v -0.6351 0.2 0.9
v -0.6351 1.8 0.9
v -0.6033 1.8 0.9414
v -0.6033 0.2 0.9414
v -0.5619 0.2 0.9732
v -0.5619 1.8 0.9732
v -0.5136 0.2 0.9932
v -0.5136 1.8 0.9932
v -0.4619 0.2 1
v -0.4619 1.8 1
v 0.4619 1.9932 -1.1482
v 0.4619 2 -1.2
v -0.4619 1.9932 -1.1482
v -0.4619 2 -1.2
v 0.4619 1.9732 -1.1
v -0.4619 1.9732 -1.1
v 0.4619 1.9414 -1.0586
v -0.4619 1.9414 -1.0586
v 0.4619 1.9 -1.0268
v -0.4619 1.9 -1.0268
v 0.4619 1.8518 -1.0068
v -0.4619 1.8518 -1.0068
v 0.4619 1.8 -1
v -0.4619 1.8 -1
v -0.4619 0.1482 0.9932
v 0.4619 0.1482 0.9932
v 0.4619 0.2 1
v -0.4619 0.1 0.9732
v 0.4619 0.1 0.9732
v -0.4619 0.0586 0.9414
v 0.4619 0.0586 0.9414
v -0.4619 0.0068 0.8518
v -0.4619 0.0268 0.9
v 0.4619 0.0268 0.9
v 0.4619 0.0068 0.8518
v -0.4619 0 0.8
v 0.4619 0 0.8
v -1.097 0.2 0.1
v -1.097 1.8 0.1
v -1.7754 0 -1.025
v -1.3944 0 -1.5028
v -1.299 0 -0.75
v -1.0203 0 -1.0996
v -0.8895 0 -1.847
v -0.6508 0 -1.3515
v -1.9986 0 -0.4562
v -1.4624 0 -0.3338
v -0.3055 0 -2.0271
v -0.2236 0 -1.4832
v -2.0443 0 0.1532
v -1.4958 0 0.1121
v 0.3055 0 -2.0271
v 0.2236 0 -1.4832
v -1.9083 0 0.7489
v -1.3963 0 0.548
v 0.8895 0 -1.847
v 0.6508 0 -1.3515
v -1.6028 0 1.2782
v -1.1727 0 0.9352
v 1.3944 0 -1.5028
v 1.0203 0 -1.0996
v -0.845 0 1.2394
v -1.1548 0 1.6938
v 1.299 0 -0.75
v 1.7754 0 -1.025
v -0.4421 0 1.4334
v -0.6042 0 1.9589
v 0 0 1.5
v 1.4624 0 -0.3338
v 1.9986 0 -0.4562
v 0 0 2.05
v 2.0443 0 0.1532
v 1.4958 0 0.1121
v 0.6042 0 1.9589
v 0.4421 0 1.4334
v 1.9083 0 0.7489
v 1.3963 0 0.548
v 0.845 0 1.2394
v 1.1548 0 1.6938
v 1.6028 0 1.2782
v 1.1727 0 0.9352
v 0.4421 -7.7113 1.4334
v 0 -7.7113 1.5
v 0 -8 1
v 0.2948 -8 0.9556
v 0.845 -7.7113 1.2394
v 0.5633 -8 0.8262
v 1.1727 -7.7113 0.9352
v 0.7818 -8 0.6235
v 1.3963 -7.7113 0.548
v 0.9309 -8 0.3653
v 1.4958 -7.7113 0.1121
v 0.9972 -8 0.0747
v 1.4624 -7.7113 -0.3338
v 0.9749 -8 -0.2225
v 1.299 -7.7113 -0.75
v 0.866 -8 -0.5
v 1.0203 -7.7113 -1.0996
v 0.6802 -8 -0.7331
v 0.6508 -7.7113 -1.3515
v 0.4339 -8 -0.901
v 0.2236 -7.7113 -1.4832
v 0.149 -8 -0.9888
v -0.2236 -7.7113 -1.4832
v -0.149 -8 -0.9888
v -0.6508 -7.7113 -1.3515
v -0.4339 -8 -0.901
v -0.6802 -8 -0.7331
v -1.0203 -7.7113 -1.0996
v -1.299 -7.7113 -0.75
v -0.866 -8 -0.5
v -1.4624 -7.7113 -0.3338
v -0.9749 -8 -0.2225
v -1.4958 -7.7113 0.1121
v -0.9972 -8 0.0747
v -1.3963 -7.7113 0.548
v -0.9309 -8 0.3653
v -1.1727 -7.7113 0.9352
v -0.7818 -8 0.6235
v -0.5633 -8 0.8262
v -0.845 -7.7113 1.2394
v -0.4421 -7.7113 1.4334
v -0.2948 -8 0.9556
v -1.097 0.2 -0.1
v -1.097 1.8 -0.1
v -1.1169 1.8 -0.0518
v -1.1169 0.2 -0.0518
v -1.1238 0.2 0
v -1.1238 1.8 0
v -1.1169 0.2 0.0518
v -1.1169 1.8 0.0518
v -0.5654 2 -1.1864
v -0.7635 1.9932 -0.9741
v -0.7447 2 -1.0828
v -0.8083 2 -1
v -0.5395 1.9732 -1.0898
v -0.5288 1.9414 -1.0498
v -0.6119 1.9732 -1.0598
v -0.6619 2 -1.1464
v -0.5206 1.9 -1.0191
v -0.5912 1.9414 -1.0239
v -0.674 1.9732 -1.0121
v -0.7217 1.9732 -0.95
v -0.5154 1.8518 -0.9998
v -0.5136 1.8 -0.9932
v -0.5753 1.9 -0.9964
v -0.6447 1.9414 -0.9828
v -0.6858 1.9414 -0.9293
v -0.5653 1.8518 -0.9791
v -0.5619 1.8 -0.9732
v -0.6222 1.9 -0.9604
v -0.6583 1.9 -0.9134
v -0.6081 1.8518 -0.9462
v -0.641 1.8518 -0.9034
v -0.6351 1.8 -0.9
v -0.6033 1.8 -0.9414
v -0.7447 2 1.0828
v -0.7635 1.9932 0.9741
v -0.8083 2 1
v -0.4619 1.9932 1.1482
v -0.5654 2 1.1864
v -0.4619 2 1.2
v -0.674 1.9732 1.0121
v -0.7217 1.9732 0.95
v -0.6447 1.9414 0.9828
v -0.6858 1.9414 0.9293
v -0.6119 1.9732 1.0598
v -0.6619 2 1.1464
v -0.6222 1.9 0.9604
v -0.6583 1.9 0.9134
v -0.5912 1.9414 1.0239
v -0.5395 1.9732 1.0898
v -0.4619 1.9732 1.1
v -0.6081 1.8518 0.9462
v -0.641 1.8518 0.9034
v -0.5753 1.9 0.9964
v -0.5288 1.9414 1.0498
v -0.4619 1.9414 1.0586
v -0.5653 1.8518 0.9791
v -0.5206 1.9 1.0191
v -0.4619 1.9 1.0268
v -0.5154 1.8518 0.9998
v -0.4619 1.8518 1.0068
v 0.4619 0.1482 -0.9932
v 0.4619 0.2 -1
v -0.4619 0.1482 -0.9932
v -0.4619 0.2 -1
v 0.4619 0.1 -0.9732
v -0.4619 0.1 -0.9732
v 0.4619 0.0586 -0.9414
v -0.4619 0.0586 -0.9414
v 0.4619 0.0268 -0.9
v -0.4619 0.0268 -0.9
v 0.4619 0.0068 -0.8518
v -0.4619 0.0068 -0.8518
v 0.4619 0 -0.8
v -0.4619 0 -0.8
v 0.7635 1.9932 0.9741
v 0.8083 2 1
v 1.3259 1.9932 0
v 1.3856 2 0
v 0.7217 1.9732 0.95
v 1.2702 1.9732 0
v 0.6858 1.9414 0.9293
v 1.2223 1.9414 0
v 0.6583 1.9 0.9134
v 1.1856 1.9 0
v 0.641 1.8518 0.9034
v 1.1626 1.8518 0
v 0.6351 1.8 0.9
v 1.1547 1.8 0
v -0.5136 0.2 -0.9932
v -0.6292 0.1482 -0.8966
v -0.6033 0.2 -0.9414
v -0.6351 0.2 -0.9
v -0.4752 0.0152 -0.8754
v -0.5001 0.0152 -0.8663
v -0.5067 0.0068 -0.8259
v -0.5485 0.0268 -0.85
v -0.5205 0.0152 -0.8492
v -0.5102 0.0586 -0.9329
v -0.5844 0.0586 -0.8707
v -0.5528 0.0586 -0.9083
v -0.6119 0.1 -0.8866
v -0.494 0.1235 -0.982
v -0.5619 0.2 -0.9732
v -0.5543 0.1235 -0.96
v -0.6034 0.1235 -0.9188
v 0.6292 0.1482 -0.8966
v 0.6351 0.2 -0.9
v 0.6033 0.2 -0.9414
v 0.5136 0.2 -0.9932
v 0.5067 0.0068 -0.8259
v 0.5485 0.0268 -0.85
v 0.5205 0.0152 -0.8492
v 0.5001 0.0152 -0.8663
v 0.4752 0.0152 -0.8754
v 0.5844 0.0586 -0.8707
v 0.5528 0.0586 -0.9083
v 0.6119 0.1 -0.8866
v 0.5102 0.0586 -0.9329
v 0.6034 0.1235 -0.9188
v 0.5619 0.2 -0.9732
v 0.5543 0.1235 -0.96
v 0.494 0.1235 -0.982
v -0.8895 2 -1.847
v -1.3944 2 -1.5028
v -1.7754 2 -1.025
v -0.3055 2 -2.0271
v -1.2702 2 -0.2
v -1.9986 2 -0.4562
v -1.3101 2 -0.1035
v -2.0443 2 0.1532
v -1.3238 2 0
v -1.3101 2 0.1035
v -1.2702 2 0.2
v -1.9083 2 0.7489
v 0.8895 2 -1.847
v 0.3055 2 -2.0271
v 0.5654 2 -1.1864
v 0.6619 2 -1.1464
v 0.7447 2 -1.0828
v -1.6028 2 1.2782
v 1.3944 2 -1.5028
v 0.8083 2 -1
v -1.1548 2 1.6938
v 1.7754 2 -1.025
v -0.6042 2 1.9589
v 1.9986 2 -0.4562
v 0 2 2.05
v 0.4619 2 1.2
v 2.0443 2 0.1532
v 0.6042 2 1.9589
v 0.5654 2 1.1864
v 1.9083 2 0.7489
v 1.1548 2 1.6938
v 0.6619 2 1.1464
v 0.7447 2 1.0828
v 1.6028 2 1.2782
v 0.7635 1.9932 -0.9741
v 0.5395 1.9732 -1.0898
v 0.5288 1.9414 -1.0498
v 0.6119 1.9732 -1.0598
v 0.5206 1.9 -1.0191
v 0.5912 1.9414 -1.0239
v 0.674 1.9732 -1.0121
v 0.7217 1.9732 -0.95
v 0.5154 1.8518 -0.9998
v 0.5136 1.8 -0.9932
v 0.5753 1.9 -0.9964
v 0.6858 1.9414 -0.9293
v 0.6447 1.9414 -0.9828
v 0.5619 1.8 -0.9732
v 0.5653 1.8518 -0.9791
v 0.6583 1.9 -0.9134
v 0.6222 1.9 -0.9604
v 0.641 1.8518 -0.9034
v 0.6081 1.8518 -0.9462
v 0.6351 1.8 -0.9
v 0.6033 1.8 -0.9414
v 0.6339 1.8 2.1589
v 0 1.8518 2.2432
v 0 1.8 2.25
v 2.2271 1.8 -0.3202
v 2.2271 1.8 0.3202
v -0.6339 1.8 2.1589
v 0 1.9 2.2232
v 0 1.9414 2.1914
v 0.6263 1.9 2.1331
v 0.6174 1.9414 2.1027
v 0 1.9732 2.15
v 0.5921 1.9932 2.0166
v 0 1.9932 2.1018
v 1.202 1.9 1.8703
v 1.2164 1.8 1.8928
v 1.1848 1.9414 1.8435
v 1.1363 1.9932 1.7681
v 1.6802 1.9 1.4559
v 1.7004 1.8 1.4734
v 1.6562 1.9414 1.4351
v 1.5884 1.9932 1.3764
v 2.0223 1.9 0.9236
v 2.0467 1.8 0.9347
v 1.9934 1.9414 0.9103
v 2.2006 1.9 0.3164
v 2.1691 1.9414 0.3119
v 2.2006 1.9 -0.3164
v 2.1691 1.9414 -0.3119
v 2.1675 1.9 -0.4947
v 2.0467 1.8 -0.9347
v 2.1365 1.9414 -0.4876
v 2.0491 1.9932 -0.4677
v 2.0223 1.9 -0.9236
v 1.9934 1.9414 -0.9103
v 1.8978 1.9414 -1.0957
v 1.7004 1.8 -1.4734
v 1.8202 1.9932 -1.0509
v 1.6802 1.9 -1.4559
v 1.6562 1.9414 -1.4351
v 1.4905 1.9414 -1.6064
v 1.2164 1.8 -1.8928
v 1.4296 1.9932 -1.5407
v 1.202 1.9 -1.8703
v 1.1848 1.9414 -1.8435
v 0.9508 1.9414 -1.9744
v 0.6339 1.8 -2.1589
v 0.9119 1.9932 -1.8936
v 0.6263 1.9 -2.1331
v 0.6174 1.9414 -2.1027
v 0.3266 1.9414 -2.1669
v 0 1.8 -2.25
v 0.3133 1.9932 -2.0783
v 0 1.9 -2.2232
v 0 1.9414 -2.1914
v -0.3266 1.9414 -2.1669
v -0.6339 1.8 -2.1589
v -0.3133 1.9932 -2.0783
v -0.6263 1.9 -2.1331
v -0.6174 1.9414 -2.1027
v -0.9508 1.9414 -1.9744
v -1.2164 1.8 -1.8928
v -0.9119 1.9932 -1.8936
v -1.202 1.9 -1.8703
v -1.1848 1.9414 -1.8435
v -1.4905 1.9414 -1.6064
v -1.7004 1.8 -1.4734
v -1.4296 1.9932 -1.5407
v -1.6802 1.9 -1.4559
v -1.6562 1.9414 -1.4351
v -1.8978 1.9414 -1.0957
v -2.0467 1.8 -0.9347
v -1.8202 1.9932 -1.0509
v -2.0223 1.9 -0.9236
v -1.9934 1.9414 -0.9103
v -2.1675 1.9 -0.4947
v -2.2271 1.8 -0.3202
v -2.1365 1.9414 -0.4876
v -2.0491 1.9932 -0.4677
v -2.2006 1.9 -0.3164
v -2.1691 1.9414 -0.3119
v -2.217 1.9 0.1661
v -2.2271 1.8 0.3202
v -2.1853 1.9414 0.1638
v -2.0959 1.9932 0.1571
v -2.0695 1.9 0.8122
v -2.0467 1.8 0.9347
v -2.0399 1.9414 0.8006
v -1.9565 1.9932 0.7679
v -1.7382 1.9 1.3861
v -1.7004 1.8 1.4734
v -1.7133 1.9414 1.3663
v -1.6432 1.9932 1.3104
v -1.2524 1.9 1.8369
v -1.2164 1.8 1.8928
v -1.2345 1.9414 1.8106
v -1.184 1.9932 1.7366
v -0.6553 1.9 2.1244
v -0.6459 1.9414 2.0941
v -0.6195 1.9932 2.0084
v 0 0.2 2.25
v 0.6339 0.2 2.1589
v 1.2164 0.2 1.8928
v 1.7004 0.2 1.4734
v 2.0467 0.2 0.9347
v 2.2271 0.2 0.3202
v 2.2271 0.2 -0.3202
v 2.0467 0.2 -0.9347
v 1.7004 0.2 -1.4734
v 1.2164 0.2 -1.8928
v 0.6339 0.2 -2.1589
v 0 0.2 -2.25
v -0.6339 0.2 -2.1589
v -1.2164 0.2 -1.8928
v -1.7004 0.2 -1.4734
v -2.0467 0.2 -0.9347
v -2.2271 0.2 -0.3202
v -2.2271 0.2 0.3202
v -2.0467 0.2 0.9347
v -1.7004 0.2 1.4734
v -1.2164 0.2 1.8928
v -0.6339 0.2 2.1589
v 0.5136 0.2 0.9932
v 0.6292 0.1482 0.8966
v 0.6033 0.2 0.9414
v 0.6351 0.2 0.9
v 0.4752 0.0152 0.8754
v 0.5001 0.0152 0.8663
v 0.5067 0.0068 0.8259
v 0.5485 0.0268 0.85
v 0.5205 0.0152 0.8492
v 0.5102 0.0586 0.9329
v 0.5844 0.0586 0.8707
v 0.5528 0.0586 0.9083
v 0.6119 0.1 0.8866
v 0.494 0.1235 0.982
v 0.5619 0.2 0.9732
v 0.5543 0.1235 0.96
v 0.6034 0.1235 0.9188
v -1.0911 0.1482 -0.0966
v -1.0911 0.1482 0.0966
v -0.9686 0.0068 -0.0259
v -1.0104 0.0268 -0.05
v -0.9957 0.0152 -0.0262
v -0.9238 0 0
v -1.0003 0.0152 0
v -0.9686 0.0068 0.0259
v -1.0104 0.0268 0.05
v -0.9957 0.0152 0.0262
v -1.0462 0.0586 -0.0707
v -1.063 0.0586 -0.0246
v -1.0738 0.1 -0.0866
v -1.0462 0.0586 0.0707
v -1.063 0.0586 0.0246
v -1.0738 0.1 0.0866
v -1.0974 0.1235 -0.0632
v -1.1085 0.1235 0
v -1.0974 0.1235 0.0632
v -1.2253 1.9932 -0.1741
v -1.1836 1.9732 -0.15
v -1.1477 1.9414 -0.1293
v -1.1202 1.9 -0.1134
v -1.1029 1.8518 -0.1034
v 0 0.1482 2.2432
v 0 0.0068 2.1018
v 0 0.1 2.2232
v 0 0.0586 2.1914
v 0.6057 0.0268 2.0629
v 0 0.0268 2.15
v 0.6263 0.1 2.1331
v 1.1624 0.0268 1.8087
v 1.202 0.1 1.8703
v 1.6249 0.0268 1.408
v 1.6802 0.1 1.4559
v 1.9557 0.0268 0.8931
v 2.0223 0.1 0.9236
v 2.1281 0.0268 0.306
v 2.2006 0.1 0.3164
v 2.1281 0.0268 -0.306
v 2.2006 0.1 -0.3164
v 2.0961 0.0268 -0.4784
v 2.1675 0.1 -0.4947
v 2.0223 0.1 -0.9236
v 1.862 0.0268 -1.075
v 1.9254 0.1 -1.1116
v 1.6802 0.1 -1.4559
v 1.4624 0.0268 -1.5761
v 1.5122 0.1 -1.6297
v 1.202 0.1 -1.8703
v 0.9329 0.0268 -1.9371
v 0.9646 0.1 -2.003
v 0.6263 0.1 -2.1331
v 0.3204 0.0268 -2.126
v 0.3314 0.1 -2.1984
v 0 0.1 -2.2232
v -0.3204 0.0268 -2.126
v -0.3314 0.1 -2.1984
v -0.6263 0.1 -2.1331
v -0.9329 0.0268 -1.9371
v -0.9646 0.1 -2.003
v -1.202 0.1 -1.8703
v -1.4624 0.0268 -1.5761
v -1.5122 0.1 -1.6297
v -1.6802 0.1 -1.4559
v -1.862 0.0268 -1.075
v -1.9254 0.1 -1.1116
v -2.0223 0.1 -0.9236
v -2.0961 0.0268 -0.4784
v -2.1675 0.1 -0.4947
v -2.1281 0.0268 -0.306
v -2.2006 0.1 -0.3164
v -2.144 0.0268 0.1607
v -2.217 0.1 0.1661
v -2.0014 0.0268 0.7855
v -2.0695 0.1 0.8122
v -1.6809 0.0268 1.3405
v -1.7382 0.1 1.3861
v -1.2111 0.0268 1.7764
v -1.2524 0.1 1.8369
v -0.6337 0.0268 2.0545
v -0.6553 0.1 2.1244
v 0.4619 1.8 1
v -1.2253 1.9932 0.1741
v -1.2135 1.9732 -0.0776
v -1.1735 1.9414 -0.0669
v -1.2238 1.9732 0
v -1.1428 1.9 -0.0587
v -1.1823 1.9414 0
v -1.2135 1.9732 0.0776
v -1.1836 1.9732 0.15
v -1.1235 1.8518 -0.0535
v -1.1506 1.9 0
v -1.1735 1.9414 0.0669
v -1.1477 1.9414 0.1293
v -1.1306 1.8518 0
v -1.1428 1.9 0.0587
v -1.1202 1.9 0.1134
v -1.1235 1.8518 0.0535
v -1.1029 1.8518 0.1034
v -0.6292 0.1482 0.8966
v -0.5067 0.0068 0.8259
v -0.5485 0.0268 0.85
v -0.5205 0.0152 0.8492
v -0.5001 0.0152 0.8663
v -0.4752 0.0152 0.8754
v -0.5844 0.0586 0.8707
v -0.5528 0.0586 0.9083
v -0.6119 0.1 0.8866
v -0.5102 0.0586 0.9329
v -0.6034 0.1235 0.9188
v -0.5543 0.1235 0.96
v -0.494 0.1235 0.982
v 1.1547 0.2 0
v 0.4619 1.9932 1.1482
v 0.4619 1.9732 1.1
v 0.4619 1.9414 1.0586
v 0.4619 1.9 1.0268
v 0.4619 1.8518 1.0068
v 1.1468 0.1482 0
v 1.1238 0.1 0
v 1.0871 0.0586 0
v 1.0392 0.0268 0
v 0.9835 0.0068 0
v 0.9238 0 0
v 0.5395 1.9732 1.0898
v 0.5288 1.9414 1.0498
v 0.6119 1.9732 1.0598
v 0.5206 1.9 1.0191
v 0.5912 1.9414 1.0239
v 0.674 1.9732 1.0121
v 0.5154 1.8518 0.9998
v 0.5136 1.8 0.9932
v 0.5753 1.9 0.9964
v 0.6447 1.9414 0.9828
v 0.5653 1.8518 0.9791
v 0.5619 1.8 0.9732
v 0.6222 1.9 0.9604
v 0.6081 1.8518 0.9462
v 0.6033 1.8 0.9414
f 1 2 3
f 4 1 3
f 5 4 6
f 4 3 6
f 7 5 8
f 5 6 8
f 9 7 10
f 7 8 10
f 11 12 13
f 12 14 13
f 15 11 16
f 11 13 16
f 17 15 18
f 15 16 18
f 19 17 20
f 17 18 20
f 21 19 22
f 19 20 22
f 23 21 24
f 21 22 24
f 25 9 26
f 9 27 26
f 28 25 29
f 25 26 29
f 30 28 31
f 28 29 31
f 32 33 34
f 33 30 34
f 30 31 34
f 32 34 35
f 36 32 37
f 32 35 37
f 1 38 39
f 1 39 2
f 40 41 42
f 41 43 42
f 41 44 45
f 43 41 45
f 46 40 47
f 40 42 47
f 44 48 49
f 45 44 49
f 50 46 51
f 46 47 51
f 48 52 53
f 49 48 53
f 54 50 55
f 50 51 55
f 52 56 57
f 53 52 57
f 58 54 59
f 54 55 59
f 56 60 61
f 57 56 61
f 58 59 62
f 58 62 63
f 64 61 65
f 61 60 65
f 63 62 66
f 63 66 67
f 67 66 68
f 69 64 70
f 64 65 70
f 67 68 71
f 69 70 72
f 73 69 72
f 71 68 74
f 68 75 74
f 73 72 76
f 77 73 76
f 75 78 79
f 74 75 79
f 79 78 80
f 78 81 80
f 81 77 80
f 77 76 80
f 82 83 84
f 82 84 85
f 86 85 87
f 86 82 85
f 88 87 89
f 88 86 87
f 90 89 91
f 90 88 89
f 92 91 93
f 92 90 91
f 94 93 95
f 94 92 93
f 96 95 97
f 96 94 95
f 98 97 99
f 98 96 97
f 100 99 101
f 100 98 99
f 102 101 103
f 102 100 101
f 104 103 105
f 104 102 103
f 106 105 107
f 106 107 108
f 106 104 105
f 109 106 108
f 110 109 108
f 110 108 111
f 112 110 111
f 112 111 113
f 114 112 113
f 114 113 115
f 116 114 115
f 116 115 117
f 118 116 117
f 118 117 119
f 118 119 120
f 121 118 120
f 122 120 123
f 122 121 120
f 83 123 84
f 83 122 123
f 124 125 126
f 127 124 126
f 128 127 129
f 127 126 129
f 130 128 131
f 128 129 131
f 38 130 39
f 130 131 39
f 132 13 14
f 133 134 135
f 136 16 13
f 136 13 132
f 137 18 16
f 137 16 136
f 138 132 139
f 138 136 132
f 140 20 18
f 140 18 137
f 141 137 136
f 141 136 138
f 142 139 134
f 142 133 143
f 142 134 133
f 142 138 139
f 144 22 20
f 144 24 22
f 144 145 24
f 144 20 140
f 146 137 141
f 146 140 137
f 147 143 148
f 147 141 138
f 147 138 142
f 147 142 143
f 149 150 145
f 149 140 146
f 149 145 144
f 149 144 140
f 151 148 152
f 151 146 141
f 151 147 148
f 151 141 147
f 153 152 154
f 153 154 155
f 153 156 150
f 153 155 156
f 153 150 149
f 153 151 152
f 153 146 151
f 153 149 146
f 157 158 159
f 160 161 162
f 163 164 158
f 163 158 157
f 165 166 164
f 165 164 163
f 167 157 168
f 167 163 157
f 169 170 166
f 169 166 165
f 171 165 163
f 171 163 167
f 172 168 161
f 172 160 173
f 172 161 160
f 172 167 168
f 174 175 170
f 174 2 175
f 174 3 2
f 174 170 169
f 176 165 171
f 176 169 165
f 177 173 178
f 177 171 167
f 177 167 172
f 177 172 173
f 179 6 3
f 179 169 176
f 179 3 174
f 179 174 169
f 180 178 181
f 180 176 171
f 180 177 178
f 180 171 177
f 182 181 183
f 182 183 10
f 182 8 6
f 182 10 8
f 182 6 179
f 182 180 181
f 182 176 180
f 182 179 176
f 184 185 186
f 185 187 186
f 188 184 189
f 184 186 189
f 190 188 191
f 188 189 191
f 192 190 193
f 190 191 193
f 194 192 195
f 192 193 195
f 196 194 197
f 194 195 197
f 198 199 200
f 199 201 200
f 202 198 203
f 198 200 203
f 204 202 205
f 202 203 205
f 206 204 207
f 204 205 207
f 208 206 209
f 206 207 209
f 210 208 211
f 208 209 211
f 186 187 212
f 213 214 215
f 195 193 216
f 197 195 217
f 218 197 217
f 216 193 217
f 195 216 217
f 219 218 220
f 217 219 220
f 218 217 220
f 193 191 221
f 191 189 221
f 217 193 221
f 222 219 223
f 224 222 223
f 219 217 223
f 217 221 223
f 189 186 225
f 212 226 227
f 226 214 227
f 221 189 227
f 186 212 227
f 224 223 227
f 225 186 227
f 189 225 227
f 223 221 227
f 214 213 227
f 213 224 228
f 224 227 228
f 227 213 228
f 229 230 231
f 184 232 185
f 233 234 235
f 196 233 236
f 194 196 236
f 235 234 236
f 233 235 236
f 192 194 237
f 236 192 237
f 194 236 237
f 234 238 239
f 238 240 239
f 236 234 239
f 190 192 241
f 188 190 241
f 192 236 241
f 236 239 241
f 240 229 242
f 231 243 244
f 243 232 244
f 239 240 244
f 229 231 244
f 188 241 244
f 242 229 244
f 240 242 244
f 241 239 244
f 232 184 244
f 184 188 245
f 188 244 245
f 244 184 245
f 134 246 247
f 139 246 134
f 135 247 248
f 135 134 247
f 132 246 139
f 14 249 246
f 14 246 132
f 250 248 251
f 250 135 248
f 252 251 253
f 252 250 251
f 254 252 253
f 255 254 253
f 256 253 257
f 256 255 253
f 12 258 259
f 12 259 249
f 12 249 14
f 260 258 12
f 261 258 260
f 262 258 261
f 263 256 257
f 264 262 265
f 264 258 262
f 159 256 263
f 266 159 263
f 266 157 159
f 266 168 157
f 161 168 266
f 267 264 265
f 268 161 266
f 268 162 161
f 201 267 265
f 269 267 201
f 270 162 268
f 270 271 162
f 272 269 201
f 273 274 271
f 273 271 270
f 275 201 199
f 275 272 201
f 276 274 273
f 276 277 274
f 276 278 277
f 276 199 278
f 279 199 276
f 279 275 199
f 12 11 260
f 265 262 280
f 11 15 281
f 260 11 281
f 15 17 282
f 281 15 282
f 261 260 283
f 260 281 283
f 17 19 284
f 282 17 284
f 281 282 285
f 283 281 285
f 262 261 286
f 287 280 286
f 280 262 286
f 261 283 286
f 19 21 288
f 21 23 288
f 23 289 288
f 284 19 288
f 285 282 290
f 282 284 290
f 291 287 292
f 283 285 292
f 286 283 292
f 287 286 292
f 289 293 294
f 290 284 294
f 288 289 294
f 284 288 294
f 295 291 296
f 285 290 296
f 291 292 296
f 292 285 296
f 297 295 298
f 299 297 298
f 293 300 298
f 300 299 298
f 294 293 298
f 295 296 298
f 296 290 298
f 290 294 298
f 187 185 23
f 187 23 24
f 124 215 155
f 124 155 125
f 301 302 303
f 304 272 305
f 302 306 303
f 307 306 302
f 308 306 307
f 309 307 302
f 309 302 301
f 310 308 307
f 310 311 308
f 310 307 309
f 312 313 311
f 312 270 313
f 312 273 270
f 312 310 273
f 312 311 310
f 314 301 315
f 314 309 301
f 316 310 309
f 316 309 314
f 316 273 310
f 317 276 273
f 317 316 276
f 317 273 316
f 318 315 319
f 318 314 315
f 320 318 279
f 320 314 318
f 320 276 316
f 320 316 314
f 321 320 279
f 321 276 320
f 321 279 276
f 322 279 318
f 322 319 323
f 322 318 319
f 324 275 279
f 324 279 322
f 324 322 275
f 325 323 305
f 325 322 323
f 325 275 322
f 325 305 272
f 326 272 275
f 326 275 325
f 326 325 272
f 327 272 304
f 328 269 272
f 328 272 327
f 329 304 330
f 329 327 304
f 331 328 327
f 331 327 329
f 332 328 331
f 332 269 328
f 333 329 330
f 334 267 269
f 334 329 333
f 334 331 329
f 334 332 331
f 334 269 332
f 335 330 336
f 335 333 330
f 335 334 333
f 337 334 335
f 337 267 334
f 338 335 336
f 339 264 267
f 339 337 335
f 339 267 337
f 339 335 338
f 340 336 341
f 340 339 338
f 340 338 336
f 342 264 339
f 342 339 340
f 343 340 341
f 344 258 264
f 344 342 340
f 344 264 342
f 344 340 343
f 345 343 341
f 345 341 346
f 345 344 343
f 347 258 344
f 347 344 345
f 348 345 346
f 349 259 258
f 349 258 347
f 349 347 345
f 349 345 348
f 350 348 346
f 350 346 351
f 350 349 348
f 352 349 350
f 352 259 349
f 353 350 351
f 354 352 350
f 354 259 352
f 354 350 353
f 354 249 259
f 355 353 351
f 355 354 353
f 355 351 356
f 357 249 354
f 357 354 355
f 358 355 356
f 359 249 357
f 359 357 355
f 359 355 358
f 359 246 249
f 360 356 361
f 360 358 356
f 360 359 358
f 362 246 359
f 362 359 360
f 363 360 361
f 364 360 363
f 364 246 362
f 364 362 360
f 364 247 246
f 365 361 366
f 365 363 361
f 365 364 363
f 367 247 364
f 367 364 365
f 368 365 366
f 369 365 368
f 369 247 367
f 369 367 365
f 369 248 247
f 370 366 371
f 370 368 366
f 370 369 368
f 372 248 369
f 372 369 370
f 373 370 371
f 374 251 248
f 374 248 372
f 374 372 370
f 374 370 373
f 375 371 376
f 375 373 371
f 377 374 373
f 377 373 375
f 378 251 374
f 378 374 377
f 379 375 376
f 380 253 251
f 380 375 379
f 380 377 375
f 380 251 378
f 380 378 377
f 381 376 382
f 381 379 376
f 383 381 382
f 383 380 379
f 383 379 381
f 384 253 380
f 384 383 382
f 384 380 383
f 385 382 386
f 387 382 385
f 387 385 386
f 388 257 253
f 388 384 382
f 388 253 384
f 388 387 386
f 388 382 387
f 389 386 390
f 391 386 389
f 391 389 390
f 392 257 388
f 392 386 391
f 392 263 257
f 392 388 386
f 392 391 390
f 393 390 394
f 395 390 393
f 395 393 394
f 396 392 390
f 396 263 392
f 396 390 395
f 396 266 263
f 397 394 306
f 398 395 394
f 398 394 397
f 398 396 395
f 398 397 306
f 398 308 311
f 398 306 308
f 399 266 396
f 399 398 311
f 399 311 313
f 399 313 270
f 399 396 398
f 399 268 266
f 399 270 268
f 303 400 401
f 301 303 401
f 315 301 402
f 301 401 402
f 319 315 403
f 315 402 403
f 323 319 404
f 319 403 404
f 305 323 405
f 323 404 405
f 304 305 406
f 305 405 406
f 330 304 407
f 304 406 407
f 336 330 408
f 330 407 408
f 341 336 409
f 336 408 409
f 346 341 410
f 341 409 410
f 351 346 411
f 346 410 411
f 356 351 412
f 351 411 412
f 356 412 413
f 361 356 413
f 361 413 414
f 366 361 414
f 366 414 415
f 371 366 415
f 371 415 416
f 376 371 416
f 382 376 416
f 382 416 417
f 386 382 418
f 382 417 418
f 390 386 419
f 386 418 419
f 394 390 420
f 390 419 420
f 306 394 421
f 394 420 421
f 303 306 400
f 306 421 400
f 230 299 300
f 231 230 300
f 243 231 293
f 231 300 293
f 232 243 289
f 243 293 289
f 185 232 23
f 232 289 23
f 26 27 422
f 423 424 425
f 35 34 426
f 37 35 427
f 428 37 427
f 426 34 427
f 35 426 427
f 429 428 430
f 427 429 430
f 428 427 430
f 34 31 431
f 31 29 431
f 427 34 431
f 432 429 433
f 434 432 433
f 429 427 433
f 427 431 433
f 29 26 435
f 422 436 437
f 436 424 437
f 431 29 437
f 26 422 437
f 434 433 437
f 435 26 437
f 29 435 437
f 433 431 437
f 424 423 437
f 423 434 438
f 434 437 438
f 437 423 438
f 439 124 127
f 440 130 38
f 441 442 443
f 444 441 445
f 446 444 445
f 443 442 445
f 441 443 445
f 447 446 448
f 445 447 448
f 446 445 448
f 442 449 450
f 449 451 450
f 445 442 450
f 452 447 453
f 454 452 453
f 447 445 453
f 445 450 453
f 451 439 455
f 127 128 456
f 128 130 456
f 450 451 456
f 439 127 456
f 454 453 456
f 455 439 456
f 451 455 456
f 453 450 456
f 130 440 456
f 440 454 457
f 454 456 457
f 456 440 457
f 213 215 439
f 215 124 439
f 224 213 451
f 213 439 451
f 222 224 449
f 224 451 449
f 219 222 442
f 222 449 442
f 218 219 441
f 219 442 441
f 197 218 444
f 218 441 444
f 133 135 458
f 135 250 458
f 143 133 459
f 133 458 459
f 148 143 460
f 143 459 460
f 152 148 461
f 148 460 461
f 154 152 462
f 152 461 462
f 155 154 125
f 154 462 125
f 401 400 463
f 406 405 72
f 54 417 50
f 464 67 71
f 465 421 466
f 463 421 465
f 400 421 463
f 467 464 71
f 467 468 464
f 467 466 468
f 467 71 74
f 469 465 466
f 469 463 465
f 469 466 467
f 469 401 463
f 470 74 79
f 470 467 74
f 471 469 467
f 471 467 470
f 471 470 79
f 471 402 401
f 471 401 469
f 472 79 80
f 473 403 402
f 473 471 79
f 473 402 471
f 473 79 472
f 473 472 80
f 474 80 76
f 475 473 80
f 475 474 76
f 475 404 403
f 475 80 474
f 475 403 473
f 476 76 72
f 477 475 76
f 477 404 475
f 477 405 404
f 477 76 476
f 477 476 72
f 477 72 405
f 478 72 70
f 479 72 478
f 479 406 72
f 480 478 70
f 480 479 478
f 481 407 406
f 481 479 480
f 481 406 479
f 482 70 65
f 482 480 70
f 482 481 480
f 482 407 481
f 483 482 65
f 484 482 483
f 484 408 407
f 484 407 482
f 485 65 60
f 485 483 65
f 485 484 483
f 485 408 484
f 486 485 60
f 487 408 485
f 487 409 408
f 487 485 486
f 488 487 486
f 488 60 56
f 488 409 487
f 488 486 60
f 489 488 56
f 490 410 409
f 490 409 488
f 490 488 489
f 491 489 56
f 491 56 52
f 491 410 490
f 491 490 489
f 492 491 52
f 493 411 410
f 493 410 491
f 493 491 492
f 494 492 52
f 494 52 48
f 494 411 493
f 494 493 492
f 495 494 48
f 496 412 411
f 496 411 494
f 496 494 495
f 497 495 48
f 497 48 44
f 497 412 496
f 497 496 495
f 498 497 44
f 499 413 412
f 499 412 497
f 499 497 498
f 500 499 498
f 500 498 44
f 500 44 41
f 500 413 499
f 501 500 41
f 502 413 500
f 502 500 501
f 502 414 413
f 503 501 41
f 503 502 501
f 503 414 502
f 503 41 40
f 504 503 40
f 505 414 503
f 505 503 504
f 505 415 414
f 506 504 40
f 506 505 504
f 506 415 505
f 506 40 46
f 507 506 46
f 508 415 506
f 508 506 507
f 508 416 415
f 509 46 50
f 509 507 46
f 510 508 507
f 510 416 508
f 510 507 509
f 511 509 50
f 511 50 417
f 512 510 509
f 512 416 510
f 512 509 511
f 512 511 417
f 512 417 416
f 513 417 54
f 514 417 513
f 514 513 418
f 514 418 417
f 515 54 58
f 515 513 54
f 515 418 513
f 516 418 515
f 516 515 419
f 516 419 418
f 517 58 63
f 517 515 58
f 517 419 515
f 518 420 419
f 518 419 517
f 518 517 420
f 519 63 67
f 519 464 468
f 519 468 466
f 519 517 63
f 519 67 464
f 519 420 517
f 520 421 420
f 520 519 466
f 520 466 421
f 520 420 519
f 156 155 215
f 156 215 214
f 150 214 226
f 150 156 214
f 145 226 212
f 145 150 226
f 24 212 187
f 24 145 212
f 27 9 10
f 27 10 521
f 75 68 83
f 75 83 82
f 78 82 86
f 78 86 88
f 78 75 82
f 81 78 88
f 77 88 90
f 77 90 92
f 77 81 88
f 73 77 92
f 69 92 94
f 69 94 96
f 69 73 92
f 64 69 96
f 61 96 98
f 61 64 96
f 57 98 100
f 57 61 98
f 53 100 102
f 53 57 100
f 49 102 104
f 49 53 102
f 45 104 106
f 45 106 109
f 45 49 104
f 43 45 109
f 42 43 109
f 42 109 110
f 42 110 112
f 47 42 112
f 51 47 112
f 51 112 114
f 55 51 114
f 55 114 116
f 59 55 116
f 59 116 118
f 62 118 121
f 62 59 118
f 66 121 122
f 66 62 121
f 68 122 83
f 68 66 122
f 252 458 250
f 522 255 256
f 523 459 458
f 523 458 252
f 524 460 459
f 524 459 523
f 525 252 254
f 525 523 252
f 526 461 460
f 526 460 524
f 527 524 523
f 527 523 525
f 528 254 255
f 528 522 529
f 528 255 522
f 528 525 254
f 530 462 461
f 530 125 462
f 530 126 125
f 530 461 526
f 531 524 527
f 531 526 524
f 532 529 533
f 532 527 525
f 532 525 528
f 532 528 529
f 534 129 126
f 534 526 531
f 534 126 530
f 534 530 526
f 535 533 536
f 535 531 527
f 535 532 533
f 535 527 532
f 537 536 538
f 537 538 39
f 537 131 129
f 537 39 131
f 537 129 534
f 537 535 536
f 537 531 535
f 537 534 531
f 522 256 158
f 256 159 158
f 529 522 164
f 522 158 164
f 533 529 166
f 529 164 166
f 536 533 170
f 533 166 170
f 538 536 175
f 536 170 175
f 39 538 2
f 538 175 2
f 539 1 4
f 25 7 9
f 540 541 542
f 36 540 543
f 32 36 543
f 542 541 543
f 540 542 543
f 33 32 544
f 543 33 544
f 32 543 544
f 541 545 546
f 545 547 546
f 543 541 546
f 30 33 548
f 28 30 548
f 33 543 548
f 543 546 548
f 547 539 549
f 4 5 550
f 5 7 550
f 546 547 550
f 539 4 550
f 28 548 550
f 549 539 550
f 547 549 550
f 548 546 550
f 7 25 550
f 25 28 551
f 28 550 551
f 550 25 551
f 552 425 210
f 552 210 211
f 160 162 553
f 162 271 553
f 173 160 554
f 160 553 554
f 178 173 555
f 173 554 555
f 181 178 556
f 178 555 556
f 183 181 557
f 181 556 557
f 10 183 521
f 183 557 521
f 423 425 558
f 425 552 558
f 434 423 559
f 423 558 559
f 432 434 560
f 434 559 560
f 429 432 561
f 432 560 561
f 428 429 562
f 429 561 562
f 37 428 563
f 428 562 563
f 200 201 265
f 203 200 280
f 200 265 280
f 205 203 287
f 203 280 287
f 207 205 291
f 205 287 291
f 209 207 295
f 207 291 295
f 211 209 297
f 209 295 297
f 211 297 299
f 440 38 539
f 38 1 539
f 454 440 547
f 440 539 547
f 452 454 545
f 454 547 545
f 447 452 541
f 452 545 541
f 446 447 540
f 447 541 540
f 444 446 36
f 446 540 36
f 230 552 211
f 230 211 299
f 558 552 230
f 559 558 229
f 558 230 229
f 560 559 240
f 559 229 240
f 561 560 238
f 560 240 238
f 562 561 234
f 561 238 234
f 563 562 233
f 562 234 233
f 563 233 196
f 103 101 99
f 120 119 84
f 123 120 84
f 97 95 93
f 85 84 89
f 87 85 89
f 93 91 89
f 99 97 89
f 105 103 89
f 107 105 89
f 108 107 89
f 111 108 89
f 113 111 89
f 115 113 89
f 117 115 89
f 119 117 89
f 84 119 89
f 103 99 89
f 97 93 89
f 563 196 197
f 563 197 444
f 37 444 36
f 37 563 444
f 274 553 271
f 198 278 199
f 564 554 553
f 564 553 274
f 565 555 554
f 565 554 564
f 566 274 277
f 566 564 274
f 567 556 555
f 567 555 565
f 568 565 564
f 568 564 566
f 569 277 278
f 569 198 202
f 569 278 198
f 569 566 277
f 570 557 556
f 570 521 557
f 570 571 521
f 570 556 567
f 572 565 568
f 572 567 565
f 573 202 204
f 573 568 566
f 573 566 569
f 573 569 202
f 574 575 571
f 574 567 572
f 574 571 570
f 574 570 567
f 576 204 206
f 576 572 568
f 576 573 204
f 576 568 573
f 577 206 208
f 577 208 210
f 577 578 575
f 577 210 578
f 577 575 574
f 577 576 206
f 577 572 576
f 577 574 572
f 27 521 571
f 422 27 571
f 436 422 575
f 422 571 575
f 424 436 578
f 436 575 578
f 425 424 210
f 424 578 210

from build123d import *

# Parameters (mm, degrees)
HEAD_SKETCH_R                  = 2.25
HEAD_DEPTH                     = 2
THREADED_SECTION_STUB_SKETCH_R = 1.5
THREADED_SECTION_DEPTH         = 8
END_OF_BOLT_CHAMFER_SIZE       = 0.5
END_OF_BOLT_CHAMFER_SIZE2      = 0.288675135
COSMETIC_FILLETS_R             = 0.2


with BuildPart() as part:
    # Head Sketch → Head (new body)
    with BuildSketch(Plane(origin=(0, 0, 0), x_dir=(1, 0, 0), z_dir=(0, 1, 0))):
        with Locations(Location((0, 0, 0), (0, 0, 270))):
            Circle(HEAD_SKETCH_R)
        Polygon((-0.577350269, 1), (-1.154700538, 0), (-0.577350269, -1), (0.577350269, -1), (1.154700538, 0), (0.577350269, 1), align=None, mode=Mode.SUBTRACT)
    extrude(amount=HEAD_DEPTH)

    # Threaded Section Stub Sketch → Threaded Section (add)
    with BuildSketch(Plane(origin=(0, 0, 0), x_dir=(1, 0, 0), z_dir=(0, 1, 0))):
        with Locations(Location((0, 0, 0), (0, 0, 270))):
            Circle(THREADED_SECTION_STUB_SKETCH_R)
    extrude(amount=-THREADED_SECTION_DEPTH)

    # End Of Bolt chamfer
    end_of_bolt_chamfer_edges = [part.edges().sort_by_distance(p)[0] for p in [
        (0, -8, -1.5),
    ]]
    end_of_bolt_chamfer_side = [part.faces().sort_by_distance(p)[0] for p in [
        (0, -8, 0),
    ]]
    chamfer(end_of_bolt_chamfer_edges, length=END_OF_BOLT_CHAMFER_SIZE, length2=END_OF_BOLT_CHAMFER_SIZE2, reference=end_of_bolt_chamfer_side[0])

    # Cosmetic Fillets
    cosmetic_fillets_edges = [part.edges().sort_by_distance(p)[0] for p in [
        (-0.577350269, 1, -1),
        (-0.8660254037844384, 0, 0.5000000000000003),
        (-1.154700538, 1, 0),
        (0, 0, 1),
        (-0.577350269, 1, 1),
        (0.8660254037844388, 0, 0.4999999999999998),
        (0.577350269, 1, 1),
        (0.8660254037844388, 0, -0.5000000000000002),
        (0, 2, -1),
        (-0.866025404, 2, -0.5),
        (-0.866025404, 2, 0.5),
        (0, 2, 1),
        (0.866025404, 2, 0.5),
        (0.866025404, 2, -0.5),
        (0, 0, -2.25),
        (0, 2, -2.25),
        (0, 0, -1),
        (0.577350269, 1, -1),
        (-0.8660254037844386, 0, -0.4999999999999998),
    ]]
    fillet(cosmetic_fillets_edges, radius=COSMETIC_FILLETS_R)


solid = part.part
